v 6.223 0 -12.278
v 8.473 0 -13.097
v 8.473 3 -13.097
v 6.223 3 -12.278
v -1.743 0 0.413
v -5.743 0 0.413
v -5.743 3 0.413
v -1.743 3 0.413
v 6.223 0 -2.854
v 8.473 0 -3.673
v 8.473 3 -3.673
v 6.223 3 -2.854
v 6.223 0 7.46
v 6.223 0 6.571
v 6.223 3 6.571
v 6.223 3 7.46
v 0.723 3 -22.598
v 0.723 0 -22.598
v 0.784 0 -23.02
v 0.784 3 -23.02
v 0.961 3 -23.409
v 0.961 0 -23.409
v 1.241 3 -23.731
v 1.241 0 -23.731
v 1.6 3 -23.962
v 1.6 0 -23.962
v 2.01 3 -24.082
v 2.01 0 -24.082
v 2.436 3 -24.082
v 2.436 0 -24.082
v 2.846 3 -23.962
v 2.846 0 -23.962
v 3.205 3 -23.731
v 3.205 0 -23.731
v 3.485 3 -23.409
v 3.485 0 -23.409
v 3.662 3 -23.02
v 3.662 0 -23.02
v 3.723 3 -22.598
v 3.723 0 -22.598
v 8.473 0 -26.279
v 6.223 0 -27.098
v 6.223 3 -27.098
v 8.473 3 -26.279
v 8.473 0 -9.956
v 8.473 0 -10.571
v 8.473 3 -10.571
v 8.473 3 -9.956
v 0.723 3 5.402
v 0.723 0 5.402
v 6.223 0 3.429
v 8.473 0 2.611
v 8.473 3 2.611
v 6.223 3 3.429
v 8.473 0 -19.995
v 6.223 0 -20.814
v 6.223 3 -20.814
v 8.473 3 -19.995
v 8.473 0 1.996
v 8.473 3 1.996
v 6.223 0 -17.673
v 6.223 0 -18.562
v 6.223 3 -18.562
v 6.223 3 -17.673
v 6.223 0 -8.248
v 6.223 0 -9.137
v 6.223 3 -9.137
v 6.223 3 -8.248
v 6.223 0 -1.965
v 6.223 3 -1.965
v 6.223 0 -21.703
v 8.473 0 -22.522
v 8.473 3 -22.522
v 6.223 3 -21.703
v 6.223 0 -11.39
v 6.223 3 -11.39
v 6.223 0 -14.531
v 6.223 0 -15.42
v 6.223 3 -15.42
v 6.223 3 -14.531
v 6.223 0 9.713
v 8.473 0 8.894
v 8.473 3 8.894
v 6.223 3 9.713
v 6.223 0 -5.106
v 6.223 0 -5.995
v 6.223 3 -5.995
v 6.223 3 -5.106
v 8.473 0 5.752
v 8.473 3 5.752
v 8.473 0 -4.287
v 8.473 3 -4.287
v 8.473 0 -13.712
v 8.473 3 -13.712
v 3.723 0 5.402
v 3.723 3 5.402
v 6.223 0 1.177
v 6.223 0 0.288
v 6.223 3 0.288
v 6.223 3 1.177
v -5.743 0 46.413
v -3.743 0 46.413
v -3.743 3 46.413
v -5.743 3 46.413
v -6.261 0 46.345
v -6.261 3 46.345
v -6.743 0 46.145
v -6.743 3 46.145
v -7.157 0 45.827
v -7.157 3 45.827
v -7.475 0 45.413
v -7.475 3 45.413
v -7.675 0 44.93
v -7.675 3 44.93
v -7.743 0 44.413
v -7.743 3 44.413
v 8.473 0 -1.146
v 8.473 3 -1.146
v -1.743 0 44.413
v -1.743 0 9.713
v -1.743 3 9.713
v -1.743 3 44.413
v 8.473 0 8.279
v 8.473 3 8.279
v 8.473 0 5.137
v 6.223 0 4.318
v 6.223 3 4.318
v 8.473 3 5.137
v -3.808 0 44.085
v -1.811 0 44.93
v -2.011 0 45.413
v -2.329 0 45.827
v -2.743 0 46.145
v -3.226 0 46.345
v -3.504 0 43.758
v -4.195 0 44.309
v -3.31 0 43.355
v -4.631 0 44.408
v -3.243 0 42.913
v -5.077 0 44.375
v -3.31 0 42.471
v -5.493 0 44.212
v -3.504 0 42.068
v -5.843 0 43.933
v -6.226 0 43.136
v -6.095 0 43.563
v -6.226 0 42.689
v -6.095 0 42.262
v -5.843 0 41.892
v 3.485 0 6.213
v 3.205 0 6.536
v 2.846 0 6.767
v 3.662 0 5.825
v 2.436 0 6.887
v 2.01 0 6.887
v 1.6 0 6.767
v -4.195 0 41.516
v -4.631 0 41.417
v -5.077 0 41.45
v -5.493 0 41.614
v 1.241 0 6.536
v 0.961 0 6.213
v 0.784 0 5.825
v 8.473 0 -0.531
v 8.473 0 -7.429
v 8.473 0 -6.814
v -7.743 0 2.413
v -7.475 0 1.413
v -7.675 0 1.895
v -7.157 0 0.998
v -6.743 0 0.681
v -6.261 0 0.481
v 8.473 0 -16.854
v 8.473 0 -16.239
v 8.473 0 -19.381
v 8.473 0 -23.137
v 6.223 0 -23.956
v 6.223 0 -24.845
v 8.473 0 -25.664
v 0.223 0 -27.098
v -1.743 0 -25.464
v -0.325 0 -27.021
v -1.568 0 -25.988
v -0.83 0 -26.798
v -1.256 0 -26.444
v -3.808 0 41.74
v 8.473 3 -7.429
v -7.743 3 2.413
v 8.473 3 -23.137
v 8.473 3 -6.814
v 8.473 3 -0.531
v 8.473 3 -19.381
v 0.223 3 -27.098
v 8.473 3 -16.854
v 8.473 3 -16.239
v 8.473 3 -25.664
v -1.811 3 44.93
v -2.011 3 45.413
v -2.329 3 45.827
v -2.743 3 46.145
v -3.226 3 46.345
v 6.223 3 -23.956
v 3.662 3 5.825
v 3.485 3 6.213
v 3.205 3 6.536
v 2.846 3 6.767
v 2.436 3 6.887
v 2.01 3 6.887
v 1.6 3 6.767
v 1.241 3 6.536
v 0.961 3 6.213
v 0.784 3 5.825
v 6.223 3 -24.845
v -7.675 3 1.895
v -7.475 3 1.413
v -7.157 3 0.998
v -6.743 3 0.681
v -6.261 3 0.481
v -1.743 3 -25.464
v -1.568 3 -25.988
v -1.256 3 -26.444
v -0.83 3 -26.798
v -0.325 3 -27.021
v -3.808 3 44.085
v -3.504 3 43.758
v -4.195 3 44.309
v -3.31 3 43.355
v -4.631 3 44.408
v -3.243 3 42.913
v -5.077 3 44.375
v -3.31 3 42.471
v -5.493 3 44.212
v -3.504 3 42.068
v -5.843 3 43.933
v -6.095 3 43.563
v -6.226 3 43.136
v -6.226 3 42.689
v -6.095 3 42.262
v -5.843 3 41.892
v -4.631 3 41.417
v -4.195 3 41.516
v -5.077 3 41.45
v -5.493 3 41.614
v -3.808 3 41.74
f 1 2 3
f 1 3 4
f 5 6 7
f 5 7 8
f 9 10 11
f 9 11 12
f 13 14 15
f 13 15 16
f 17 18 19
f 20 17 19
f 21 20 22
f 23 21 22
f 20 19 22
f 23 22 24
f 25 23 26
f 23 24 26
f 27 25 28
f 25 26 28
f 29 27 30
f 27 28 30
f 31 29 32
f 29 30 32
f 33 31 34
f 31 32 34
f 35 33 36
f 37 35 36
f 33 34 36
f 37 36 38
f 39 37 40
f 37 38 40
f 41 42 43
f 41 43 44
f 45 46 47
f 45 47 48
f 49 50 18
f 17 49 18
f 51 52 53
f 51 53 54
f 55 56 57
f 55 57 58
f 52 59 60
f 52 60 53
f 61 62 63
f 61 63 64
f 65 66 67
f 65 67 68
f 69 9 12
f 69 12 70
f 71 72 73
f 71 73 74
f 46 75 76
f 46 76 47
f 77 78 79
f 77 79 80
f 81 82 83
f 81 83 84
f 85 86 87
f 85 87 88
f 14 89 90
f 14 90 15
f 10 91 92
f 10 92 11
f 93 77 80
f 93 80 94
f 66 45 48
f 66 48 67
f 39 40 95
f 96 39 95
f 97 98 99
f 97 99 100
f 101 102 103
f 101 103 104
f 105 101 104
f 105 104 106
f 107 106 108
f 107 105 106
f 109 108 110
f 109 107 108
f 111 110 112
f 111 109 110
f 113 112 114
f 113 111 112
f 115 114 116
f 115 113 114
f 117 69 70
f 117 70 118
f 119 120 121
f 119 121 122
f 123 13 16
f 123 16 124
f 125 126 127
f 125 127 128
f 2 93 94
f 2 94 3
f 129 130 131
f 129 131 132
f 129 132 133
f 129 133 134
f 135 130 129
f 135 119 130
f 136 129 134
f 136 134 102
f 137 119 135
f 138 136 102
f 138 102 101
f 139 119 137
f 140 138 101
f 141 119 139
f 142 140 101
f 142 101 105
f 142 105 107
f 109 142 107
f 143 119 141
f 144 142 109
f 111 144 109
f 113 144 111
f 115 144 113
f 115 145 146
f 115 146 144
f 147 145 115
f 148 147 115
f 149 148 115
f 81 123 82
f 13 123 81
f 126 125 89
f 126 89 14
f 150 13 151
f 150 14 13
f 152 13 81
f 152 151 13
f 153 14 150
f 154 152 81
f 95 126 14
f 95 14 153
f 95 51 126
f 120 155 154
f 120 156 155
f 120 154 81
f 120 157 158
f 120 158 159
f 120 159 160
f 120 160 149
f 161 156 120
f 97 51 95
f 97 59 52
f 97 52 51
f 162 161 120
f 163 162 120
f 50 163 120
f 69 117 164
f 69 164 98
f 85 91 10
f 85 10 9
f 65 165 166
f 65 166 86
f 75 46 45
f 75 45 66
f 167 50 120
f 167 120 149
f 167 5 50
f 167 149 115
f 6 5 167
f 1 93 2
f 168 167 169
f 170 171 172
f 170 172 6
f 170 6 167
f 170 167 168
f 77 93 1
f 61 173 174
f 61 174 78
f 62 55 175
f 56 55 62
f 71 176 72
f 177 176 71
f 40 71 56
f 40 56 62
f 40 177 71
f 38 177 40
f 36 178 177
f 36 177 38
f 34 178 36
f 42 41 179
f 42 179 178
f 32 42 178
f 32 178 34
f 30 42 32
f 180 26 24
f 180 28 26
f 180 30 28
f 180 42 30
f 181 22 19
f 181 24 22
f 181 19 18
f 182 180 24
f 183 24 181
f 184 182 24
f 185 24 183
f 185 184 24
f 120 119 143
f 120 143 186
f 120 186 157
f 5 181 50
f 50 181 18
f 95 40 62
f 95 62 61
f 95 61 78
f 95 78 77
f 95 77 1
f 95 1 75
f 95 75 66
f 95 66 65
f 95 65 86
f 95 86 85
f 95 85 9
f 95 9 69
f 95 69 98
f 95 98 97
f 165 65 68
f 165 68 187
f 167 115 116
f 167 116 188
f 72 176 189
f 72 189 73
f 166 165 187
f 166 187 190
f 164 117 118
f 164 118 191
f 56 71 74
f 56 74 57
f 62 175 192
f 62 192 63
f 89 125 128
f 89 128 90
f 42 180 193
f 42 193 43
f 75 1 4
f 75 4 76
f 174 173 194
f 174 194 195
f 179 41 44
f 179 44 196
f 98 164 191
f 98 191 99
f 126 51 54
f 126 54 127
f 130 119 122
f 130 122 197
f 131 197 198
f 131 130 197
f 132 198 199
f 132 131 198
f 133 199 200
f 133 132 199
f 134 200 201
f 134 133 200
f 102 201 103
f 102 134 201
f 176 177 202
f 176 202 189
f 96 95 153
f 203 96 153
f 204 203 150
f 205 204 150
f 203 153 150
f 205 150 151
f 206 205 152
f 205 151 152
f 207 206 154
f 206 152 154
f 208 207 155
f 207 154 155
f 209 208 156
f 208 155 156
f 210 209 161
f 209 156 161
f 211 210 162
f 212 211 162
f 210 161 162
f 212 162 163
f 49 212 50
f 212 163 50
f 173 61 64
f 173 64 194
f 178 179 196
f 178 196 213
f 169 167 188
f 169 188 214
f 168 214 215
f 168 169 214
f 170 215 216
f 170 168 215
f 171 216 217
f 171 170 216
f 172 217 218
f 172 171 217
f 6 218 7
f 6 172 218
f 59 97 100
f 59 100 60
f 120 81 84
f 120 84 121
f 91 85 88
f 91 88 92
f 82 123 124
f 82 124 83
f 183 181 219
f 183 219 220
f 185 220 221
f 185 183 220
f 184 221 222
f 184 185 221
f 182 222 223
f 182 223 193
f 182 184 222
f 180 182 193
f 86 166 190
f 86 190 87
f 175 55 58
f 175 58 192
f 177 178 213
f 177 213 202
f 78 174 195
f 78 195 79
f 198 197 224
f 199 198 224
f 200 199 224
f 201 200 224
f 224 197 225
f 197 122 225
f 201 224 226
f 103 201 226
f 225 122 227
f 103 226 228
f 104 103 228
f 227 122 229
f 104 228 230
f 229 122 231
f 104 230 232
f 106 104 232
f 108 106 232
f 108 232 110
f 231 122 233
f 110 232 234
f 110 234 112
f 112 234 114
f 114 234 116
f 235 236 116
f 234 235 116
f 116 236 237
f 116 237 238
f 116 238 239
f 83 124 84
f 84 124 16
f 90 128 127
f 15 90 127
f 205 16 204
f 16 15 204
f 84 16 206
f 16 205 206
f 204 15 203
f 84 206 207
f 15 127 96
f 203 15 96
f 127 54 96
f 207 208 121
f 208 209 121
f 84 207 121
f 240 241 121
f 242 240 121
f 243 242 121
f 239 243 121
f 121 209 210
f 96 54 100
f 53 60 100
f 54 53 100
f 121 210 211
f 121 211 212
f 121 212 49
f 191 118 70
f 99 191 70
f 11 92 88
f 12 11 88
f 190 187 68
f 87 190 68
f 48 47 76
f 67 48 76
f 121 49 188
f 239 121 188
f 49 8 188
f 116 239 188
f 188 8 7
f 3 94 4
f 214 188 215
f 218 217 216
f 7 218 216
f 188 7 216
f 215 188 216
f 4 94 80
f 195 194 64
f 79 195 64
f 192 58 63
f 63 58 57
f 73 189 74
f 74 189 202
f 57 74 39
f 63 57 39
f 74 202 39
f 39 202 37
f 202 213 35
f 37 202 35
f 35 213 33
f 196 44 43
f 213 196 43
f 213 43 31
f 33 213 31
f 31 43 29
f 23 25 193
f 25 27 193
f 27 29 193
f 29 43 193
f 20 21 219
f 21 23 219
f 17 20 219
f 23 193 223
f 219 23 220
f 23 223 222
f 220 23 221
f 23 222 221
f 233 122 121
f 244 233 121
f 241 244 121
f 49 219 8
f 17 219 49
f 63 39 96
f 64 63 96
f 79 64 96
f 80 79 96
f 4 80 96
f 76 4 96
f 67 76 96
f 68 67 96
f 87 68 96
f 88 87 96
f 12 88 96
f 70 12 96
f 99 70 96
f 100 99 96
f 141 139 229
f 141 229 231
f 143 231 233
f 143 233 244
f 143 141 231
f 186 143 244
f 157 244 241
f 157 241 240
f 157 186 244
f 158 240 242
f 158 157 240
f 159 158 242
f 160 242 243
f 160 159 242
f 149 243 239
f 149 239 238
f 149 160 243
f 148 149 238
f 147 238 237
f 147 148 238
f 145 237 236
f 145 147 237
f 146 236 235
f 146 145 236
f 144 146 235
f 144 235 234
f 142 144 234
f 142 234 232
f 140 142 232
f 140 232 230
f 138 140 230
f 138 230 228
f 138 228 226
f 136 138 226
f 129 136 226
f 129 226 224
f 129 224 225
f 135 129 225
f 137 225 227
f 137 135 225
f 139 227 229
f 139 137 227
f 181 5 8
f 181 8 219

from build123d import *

# Parameters (mm, degrees)
CROQUIS1_R              = 1.5
SALIENTE_EXTRUIR2_DEPTH = 3


with BuildPart() as part:
    # Croquis1 → Saliente-Extruir2 (new body)
    with BuildSketch(Plane(origin=(0, 0, 0), x_dir=(1, 0, 0), z_dir=(0, 1, 0))):
        with BuildLine():
            Line((0.222991841, 27.097579335), (6.222991841, 27.097579335))
            Line((6.222991841, 27.097579335), (8.472991841, 26.278646308))
            Line((8.472991841, 26.278646308), (8.472991841, 25.663790451))
            Line((8.472991841, 25.663790451), (6.222991841, 24.844857424))
            Line((6.222991841, 24.844857424), (6.222991841, 23.955986685))
            Line((6.222991841, 23.955986685), (8.472991841, 23.137053658))
            Line((8.472991841, 23.137053658), (8.472991841, 22.522197801))
            Line((8.472991841, 22.522197801), (6.222991841, 21.703264774))
            Line((6.222991841, 21.703264774), (6.222991841, 20.814394035))
            Line((6.222991841, 20.814394035), (8.472991841, 19.995461008))
            Line((8.472991841, 19.995461008), (8.472991841, 19.380605151))
            Line((8.472991841, 19.380605151), (6.222991841, 18.561672124))
            Line((6.222991841, 18.561672124), (6.222991841, 17.672801385))
            Line((6.222991841, 17.672801385), (8.472991841, 16.853868358))
            Line((8.472991841, 16.853868358), (8.472991841, 16.239012501))
            Line((8.472991841, 16.239012501), (6.222991841, 15.420079474))
            Line((6.222991841, 15.420079474), (6.222991841, 14.531208735))
            Line((6.222991841, 14.531208735), (8.472991841, 13.712275708))
            Line((8.472991841, 13.712275708), (8.472991841, 13.097419851))
            Line((8.472991841, 13.097419851), (6.222991841, 12.278486824))
            Line((6.222991841, 12.278486824), (6.222991841, 11.389616085))
            Line((6.222991841, 11.389616085), (8.472991841, 10.570683058))
            Line((8.472991841, 10.570683058), (8.472991841, 9.955827201))
            Line((8.472991841, 9.955827201), (6.222991841, 9.136894174))
            Line((6.222991841, 9.136894174), (6.222991841, 8.248023435))
            Line((6.222991841, 8.248023435), (8.472991841, 7.429090408))
            Line((8.472991841, 7.429090408), (8.472991841, 6.814234551))
            Line((8.472991841, 6.814234551), (6.222991841, 5.995301524))
            Line((6.222991841, 5.995301524), (6.222991841, 5.106430785))
            Line((6.222991841, 5.106430785), (8.472991841, 4.287497758))
            Line((8.472991841, 4.287497758), (8.472991841, 3.672641901))
            Line((8.472991841, 3.672641901), (6.222991841, 2.853708874))
            Line((6.222991841, 2.853708874), (6.222991841, 1.964838135))
            Line((6.222991841, 1.964838135), (8.472991841, 1.145905108))
            Line((8.472991841, 1.145905108), (8.472991841, 0.531049251))
            Line((8.472991841, 0.531049251), (6.222991841, -0.287883776))
            Line((6.222991841, -0.287883776), (6.222991841, -1.176754515))
            Line((6.222991841, -1.176754515), (8.472991841, -1.995687542))
            Line((8.472991841, -1.995687542), (8.472991841, -2.610543399))
            Line((8.472991841, -2.610543399), (6.222991841, -3.429476426))
            Line((6.222991841, -3.429476426), (6.222991841, -4.318347165))
            Line((6.222991841, -4.318347165), (8.472991841, -5.137280192))
            Line((8.472991841, -5.137280192), (8.472991841, -5.752136049))
            Line((8.472991841, -5.752136049), (6.222991841, -6.571069076))
            Line((6.222991841, -6.571069076), (6.222991841, -7.459939815))
            Line((6.222991841, -7.459939815), (8.472991841, -8.278872842))
            Line((8.472991841, -8.278872842), (8.472991841, -8.893728699))
            Line((8.472991841, -8.893728699), (6.222991841, -9.712661726))
            Line((6.222991841, -9.712661726), (0.256792505, -9.712661726))
            Line((0.256792505, -9.712661726), (-1.743207495, -9.712661726))
            Line((-1.743207495, -9.712661726), (-1.743207495, -44.412661726))
            ThreePointArc((-1.743207495, -44.412661726), (-2.328993932, -45.826875288), (-3.743207495, -46.412661726))
            Line((-3.743207495, -46.412661726), (-5.743207495, -46.412661726))
            ThreePointArc((-5.743207495, -46.412661726), (-7.157421057, -45.826875288), (-7.743207495, -44.412661726))
            Line((-7.743207495, -44.412661726), (-7.743207495, -6.412661726))
            Line((-7.743207495, -6.412661726), (-7.743207495, -4.412661726))
            Line((-7.743207495, -4.412661726), (-7.743207495, -2.412661726))
            ThreePointArc((-7.743207495, -2.412661726), (-7.157421057, -0.998448163), (-5.743207495, -0.412661726))
            Line((-5.743207495, -0.412661726), (-1.743207495, -0.412661726))
            Line((-1.743207495, -0.412661726), (-1.743207495, 25.463721618))
            ThreePointArc((-1.743207495, 25.463721618), (-1.055232598, 26.635806328), (0.222991841, 27.097579335))
        make_face()
        with Locations((-4.743207495, -42.912661726)):
            Circle(CROQUIS1_R, mode=Mode.SUBTRACT)
        with BuildLine():
            Line((3.722991841, 22.597579335), (3.722991841, -5.402420665))
            ThreePointArc((3.722991841, -5.402420665), (2.222991841, -6.902420665), (0.722991841, -5.402420665))
            Line((0.722991841, -5.402420665), (0.722991841, 22.597579335))
            ThreePointArc((0.722991841, 22.597579335), (2.222991841, 24.097579335), (3.722991841, 22.597579335))
        make_face(mode=Mode.SUBTRACT)
    extrude(amount=SALIENTE_EXTRUIR2_DEPTH)


solid = part.part
